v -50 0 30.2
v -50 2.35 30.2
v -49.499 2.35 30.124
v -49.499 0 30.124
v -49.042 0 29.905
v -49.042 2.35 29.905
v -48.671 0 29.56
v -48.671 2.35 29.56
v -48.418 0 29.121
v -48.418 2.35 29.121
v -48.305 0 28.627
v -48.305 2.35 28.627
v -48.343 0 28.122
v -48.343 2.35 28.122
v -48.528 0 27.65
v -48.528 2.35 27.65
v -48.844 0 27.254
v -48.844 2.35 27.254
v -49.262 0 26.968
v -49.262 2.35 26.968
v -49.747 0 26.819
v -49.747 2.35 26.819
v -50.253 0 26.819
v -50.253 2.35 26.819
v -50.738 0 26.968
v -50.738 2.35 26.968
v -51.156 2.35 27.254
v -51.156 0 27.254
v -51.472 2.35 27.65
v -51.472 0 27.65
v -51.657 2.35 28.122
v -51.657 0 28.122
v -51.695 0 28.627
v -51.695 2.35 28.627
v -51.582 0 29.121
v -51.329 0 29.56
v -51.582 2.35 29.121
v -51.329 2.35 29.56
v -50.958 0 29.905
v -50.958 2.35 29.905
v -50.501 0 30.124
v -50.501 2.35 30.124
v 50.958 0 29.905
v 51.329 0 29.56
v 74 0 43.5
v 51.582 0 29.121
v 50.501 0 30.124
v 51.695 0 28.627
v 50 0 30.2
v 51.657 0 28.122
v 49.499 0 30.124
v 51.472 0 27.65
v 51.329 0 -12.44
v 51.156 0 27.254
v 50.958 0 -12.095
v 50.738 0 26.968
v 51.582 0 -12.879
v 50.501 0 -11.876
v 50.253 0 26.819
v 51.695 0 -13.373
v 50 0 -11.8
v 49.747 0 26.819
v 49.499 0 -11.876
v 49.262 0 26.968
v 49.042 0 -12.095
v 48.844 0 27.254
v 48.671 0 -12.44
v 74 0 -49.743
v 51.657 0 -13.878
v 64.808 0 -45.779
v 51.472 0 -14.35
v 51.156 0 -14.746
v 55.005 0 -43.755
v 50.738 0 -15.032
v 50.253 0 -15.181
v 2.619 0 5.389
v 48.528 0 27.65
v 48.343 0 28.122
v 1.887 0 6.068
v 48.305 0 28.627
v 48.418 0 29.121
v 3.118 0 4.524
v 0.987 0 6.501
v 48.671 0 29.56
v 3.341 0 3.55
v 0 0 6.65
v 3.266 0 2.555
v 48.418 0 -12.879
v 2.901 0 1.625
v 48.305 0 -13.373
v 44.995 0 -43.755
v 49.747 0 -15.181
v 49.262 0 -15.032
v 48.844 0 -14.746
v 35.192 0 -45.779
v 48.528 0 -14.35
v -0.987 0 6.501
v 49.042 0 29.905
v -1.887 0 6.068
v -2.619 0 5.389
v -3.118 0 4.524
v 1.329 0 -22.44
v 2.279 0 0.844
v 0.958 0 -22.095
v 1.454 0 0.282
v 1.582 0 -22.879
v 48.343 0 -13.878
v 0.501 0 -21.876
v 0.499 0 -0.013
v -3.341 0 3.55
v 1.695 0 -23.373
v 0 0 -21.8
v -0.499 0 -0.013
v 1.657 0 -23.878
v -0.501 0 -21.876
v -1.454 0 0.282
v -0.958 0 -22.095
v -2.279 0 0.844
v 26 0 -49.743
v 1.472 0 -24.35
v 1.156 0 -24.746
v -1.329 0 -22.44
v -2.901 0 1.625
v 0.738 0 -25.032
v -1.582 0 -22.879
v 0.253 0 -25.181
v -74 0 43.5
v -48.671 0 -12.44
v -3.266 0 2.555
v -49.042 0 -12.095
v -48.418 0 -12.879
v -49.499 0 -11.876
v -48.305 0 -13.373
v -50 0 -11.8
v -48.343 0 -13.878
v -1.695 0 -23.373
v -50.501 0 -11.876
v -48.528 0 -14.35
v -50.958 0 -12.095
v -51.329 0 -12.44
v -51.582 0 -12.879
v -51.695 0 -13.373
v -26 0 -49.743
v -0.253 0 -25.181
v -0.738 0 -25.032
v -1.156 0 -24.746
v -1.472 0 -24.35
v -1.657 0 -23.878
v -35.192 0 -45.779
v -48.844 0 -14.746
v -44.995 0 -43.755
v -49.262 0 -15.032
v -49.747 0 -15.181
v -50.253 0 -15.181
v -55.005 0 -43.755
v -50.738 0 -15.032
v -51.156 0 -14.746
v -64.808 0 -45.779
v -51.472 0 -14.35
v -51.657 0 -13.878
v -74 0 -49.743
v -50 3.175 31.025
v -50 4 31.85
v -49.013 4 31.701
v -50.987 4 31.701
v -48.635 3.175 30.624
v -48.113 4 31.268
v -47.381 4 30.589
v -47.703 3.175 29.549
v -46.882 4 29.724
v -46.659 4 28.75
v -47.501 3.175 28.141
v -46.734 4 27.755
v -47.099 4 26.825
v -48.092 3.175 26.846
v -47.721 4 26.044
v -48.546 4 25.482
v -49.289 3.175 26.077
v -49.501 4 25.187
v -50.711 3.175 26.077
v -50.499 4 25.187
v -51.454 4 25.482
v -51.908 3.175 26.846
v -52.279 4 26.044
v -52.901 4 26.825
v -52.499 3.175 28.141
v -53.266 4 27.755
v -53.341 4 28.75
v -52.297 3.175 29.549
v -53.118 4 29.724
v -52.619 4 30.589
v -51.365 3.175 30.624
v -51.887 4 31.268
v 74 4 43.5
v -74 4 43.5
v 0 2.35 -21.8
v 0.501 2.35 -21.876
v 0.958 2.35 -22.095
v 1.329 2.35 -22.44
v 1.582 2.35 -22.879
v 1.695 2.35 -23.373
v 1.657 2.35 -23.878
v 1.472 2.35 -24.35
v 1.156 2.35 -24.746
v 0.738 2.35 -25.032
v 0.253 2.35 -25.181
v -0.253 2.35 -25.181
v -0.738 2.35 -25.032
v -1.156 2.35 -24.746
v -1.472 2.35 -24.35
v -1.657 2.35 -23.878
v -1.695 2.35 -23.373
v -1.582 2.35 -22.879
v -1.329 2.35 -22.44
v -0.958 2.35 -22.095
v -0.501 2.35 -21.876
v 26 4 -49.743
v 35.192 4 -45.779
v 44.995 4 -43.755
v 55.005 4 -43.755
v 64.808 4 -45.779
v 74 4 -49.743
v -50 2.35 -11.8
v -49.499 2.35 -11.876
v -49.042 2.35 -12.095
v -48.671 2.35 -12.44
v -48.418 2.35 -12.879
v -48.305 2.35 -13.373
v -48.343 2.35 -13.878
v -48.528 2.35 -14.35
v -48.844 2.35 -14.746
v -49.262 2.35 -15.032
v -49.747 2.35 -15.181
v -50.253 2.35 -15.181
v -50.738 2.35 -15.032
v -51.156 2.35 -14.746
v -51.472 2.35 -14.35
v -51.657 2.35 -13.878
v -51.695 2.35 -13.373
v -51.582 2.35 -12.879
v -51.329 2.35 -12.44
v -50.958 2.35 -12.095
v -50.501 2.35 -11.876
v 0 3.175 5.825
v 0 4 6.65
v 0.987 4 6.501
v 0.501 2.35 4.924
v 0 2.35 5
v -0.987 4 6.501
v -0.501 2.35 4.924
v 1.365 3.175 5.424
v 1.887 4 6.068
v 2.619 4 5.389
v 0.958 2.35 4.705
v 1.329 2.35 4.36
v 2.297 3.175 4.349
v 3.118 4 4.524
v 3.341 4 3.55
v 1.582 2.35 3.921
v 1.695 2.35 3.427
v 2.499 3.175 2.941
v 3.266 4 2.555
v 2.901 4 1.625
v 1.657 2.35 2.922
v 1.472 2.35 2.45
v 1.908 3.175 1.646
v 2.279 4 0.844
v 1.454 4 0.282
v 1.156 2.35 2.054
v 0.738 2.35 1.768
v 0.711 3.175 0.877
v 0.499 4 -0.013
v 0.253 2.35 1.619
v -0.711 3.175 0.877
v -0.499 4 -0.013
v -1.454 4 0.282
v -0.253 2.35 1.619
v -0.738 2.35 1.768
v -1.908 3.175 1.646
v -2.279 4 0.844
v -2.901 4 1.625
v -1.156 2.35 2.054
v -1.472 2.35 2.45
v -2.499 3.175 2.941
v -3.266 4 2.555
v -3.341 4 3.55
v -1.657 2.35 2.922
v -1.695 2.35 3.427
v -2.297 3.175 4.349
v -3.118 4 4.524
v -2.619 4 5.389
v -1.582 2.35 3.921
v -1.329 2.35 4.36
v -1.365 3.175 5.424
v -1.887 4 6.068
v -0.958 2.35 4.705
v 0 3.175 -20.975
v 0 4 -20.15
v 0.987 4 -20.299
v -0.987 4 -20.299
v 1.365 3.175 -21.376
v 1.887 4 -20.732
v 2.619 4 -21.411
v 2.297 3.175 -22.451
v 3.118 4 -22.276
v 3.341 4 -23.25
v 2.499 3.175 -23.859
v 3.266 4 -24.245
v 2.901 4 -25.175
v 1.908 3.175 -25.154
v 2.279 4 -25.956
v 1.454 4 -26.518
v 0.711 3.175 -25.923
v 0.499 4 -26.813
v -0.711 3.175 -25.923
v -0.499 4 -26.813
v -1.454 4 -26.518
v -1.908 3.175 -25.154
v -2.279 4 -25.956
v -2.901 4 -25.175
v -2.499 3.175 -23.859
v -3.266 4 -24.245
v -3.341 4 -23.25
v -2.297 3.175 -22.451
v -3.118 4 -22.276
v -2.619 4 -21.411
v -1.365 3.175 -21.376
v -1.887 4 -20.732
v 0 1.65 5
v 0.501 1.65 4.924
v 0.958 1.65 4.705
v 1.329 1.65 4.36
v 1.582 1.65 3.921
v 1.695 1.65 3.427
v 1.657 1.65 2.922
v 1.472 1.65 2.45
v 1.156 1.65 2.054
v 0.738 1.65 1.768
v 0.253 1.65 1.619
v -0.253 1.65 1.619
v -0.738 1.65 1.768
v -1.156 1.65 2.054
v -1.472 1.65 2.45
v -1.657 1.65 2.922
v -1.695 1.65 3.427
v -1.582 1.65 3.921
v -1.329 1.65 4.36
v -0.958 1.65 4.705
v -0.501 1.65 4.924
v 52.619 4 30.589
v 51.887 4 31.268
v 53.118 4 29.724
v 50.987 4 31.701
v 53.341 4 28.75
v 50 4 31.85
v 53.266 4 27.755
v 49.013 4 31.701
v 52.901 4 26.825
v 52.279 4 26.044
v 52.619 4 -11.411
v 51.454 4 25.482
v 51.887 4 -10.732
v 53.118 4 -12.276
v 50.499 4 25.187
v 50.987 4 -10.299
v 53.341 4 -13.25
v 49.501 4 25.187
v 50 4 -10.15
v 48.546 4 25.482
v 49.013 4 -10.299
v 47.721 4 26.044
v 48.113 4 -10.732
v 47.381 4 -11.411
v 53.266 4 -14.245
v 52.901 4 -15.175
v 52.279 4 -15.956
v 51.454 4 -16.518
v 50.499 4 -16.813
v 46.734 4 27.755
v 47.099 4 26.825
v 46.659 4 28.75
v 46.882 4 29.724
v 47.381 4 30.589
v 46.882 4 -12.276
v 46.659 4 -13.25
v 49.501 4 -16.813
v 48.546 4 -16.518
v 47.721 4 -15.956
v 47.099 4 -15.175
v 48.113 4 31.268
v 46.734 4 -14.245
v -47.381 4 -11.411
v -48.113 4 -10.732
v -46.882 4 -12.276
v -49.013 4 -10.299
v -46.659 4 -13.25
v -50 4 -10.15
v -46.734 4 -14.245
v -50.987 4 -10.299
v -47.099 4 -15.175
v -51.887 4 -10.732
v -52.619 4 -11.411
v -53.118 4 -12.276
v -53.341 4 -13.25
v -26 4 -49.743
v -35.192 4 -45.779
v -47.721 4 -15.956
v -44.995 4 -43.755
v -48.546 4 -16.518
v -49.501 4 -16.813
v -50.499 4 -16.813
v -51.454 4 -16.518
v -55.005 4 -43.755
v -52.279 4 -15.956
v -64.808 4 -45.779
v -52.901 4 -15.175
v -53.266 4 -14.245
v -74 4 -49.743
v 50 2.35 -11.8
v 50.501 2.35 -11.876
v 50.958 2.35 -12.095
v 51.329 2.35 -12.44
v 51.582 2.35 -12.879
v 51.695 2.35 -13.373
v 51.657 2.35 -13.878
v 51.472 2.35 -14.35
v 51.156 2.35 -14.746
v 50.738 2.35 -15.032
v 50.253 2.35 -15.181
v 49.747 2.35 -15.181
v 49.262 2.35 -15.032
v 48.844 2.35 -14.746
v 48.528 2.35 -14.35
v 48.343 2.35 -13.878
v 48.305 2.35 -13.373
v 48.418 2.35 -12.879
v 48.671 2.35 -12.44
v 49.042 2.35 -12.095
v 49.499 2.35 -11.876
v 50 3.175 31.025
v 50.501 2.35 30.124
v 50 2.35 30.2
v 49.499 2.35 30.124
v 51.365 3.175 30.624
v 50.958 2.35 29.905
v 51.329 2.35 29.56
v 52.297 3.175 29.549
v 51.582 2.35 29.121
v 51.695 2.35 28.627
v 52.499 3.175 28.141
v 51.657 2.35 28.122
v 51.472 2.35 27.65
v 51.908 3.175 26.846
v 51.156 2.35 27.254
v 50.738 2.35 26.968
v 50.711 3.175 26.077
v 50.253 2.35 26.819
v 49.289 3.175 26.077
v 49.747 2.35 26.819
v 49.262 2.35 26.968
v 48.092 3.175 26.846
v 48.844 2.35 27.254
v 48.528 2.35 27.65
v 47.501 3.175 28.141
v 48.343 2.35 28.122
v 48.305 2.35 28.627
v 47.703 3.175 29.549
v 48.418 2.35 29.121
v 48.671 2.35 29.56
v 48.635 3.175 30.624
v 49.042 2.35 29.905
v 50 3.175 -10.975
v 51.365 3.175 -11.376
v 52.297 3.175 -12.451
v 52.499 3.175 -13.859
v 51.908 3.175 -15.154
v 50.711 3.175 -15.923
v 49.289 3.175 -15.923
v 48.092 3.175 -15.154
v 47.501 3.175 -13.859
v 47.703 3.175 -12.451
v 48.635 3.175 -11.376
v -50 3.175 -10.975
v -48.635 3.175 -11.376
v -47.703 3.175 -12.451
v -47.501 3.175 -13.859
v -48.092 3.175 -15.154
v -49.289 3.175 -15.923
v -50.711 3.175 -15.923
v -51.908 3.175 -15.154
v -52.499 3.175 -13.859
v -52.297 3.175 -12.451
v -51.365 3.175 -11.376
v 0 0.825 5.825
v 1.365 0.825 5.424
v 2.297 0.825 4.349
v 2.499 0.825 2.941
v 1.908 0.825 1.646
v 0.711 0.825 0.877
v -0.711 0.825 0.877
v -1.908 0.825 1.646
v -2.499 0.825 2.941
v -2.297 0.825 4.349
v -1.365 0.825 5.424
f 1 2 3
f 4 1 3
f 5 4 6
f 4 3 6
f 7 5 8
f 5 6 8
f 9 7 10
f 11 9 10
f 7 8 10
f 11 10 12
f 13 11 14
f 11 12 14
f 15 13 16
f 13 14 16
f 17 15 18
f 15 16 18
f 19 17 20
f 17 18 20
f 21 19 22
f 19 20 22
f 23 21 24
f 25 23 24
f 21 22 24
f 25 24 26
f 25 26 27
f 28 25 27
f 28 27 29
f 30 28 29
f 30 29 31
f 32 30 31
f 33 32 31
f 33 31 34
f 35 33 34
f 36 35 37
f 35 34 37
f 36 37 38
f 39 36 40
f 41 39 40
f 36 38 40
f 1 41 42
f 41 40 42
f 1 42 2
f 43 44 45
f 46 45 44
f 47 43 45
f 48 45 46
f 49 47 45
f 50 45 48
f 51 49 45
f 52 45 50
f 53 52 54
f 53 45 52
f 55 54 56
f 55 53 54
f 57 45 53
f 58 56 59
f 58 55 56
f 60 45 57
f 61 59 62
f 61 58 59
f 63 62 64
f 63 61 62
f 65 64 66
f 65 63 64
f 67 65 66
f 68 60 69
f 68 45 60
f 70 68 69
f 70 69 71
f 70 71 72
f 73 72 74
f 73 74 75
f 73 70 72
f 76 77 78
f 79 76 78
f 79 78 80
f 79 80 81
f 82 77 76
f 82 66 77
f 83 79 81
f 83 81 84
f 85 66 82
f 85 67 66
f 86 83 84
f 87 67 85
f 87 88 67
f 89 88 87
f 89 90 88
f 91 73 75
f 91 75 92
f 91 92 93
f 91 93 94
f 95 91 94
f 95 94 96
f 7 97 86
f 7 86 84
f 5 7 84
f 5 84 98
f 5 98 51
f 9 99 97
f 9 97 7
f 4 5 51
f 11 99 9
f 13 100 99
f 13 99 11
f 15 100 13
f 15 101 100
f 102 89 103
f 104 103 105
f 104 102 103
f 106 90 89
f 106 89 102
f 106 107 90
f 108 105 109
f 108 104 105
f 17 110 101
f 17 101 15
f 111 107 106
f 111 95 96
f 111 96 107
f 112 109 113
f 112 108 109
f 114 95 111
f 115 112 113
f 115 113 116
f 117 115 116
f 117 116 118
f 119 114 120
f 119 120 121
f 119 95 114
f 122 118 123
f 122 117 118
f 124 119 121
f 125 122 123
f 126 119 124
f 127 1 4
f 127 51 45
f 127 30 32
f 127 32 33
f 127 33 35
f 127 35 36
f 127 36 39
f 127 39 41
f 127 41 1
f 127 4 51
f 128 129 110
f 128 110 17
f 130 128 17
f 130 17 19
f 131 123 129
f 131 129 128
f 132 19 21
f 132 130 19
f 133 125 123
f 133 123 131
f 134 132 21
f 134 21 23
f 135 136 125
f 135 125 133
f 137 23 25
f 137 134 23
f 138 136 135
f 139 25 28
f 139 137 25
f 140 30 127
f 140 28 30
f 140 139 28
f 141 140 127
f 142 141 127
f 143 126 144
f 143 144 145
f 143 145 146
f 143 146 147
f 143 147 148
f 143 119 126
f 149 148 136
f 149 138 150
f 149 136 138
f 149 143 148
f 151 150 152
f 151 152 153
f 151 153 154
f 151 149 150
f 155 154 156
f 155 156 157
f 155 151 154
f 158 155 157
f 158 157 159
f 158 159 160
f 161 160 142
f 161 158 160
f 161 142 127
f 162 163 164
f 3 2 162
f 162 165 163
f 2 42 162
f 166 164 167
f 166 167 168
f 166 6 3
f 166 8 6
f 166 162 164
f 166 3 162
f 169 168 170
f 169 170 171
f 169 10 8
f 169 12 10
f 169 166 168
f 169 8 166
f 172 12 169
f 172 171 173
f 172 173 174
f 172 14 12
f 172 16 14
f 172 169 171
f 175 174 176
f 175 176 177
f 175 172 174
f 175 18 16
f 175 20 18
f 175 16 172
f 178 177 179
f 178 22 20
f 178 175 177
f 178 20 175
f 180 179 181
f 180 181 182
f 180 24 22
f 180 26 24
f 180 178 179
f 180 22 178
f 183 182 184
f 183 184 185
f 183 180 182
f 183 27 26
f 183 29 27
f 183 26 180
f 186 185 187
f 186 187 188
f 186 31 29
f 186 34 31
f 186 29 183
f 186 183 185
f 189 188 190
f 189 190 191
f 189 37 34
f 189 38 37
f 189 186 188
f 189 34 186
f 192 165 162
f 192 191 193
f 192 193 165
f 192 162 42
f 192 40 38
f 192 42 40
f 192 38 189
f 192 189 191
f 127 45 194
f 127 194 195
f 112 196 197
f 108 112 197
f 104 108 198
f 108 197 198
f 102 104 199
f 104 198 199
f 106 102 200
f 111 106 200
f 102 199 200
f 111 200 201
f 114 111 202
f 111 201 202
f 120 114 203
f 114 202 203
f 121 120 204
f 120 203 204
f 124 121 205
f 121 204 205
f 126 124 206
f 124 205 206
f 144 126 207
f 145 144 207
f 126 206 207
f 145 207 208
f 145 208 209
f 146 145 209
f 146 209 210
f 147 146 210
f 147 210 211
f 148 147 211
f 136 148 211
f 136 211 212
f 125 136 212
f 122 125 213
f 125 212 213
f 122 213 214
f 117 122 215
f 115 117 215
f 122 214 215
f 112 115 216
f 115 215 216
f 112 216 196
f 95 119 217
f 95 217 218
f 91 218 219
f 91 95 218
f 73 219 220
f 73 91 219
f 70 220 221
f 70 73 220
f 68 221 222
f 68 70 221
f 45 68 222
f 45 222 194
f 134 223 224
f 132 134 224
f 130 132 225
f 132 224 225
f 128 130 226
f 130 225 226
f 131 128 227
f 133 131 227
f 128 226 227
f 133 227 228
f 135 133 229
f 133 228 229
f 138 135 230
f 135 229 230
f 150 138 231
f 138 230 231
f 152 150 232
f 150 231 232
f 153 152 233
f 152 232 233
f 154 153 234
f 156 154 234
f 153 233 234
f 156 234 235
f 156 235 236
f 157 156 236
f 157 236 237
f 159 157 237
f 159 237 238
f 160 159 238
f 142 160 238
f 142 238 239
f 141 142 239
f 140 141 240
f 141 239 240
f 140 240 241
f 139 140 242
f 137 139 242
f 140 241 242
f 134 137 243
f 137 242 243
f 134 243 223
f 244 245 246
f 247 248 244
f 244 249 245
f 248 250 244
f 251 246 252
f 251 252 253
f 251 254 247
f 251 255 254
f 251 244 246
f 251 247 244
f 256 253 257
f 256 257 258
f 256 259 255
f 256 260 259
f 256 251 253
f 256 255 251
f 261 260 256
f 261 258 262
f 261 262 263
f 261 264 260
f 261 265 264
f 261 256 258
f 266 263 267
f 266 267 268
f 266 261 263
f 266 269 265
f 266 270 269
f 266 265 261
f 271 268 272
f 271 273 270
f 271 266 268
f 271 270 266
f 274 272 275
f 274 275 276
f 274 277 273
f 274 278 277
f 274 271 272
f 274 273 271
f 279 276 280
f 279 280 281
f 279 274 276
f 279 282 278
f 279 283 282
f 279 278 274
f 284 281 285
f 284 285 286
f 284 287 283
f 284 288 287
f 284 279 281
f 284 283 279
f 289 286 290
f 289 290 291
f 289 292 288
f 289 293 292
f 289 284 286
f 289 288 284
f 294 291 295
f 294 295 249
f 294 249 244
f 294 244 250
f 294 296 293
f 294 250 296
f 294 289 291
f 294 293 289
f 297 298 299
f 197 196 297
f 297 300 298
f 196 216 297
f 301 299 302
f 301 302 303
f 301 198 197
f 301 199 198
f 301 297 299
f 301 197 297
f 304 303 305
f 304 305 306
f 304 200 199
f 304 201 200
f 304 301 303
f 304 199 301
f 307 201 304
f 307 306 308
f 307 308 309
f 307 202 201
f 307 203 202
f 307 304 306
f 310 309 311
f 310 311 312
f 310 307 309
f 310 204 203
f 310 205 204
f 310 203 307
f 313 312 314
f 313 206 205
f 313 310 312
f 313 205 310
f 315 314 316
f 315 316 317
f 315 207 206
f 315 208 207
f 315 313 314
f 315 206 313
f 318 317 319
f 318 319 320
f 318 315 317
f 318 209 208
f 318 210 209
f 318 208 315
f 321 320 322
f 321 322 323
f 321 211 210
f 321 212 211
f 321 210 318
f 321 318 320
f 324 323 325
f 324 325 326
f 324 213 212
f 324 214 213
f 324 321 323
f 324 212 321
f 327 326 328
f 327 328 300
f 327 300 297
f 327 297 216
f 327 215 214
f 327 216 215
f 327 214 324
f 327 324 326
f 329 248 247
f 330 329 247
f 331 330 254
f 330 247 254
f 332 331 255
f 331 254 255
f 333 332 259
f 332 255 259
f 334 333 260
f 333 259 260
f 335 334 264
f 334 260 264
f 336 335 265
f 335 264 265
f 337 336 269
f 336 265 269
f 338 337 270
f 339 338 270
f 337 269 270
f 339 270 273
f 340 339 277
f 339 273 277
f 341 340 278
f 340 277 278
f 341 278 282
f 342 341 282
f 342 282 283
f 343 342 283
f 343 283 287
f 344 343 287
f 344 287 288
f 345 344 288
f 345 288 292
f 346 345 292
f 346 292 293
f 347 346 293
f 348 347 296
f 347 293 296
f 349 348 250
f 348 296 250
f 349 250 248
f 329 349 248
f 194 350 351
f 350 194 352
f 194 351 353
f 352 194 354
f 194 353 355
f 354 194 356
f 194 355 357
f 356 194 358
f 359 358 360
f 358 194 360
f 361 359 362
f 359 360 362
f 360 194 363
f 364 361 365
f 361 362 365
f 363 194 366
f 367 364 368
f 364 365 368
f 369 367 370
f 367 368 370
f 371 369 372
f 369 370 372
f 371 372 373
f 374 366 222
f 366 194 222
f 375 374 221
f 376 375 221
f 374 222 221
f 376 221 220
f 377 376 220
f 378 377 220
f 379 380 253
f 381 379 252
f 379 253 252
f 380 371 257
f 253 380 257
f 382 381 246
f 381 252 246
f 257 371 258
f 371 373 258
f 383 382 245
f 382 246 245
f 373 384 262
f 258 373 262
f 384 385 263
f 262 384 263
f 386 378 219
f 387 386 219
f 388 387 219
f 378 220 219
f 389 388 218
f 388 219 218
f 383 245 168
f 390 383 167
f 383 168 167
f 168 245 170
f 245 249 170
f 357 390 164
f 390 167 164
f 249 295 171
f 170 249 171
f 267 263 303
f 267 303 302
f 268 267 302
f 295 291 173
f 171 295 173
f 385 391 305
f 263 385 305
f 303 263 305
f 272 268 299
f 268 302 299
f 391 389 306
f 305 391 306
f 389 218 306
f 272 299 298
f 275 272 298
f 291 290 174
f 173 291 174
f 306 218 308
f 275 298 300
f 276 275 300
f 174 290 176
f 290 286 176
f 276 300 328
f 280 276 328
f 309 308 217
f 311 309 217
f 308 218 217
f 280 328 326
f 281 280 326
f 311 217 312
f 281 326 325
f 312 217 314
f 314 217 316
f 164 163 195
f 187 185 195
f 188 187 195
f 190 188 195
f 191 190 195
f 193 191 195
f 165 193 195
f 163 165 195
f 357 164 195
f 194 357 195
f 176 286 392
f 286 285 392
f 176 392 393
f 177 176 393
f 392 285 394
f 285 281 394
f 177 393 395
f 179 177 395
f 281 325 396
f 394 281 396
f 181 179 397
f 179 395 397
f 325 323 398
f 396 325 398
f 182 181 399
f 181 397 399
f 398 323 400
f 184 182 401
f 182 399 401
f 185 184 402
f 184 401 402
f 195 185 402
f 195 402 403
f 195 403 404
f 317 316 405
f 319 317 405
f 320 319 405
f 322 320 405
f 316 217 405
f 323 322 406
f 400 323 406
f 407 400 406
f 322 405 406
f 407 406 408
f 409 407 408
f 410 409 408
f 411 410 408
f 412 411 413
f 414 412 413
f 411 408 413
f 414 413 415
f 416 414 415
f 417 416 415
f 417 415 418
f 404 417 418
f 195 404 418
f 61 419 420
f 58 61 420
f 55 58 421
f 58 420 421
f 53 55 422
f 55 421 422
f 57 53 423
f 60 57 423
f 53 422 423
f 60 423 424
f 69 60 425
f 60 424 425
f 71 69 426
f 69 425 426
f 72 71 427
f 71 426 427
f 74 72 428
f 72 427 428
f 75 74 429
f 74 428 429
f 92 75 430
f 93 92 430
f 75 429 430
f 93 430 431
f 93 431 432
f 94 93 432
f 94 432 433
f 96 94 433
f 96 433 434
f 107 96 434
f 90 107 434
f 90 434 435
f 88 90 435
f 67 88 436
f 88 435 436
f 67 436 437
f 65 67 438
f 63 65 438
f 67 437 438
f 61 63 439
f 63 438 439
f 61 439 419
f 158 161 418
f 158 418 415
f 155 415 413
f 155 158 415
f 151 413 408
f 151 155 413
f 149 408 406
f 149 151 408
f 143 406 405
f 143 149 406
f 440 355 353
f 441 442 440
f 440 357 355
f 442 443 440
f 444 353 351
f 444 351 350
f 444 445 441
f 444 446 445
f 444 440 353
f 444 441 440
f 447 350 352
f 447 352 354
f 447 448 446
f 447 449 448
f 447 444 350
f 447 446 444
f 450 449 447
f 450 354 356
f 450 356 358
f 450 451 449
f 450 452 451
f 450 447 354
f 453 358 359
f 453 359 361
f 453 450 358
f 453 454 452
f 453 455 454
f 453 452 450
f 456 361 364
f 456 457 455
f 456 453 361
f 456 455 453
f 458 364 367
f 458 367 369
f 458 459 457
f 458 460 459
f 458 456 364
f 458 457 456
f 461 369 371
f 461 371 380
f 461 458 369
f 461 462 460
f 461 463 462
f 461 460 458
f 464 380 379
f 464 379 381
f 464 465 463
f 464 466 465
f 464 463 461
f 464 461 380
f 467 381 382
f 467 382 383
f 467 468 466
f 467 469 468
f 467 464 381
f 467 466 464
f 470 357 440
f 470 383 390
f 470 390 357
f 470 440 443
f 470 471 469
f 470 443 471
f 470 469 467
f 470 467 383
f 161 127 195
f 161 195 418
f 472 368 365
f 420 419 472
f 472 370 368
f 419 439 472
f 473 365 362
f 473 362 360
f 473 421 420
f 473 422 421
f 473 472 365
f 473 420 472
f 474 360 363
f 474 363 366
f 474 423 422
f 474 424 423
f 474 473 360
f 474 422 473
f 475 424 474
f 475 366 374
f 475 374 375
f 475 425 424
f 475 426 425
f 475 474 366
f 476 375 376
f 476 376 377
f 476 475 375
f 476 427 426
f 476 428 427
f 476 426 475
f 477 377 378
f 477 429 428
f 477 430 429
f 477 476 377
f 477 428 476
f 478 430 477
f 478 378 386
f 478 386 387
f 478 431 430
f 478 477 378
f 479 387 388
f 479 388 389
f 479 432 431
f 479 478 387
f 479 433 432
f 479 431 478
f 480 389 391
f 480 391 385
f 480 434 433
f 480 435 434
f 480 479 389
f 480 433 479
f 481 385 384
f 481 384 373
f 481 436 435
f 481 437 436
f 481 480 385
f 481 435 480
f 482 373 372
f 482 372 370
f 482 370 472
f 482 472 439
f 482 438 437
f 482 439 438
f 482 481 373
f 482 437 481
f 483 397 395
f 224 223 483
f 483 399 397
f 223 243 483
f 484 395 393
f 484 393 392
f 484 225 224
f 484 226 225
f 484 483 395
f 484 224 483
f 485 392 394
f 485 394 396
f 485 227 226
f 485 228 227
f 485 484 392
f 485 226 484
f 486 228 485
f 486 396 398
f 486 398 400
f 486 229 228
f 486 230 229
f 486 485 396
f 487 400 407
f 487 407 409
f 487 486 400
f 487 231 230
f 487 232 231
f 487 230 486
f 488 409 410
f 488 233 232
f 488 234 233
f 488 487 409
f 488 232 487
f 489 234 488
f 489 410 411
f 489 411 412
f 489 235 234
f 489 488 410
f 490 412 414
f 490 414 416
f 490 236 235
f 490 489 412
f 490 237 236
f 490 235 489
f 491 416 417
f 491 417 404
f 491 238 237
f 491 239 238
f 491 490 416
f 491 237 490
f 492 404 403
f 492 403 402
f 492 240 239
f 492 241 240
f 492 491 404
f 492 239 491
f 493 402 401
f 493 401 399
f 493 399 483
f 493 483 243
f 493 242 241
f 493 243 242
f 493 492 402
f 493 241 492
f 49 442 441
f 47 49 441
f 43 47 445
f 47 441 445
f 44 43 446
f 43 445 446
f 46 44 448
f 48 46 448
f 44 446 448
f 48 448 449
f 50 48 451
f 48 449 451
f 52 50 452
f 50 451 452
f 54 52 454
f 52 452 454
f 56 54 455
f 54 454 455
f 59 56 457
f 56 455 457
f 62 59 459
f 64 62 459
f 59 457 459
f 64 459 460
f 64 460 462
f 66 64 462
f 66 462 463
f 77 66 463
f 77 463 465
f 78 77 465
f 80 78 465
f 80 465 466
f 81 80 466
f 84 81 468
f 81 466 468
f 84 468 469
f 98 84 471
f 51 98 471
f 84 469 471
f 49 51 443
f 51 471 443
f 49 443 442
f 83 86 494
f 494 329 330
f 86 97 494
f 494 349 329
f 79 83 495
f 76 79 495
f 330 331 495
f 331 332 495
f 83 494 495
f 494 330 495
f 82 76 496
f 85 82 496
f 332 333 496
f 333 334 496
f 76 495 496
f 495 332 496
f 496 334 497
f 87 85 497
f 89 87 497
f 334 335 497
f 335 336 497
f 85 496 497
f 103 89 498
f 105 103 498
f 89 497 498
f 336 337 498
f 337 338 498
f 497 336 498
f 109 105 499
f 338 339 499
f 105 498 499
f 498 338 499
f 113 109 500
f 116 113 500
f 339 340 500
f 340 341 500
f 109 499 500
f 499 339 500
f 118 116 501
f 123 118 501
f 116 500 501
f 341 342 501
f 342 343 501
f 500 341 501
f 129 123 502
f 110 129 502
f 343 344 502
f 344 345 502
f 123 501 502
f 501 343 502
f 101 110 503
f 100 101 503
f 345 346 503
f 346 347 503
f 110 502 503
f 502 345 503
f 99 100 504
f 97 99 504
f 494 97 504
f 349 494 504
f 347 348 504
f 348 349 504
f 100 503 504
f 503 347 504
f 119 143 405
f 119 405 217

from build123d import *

# Parameters (mm, degrees)
BOSS_EXTRUDE1_DEPTH = 4
SKETCH4_R           = 1.7
CUT_EXTRUDE1_DEPTH  = 4
CHAMFER1_SIZE       = 1.65


with BuildPart() as part:
    # Sketch1 → Boss-Extrude1 (new body)
    with BuildSketch(Plane(origin=(0, 0, 0), x_dir=(1, 0, 0), z_dir=(0, 1, 0))):
        with BuildLine():
            Line((-74, 43.5), (-74, 49.7434598))
            ThreePointArc((-74, 49.7434598), (-50, 43.5), (-26, 49.7434598))
            Line((-26, 49.7434598), (26, 49.7434598))
            ThreePointArc((26, 49.7434598), (50, 43.5), (74, 49.7434598))
            Line((74, 49.7434598), (74, 43.5))
            Line((74, 43.5), (74, -43.5))
            Line((74, -43.5), (-74, -43.5))
            Line((-74, -43.5), (-74, 43.5))
        make_face()
    extrude(amount=BOSS_EXTRUDE1_DEPTH)

    # Sketch4 → Cut-Extrude1 (cut)
    with BuildSketch(Plane(origin=(0, 4, 0), x_dir=(1, 0, 0), z_dir=(0, 1, 0))):
        with Locations(Location((-50, -28.5, 0), (0, 0, 270))):
            Circle(SKETCH4_R)
        with Locations(Location((-50, 13.5, 0), (0, 0, 270))):
            Circle(SKETCH4_R)
        with Locations(Location((0, -3.3, 0), (0, 0, 270))):
            Circle(SKETCH4_R)
        with Locations(Location((0, 23.5, 0), (0, 0, 270))):
            Circle(SKETCH4_R)
        with Locations(Location((50, -28.5, 0), (0, 0, 270))):
            Circle(SKETCH4_R)
        with Locations(Location((50, 13.5, 0), (0, 0, 270))):
            Circle(SKETCH4_R)
    extrude(amount=-CUT_EXTRUDE1_DEPTH, mode=Mode.SUBTRACT)

    # Chamfer1
    chamfer1_edges = [part.edges().sort_by_distance(p)[0] for p in [
        (50, 4, 26.8),
        (0, 4, -25.2),
        (0, 4, 1.6),
        (0, 0, 1.6),
        (-50, 4, -15.2),
        (50, 4, -15.2),
        (-50, 4, 26.8),
    ]]
    chamfer(chamfer1_edges, length=CHAMFER1_SIZE)


solid = part.part
